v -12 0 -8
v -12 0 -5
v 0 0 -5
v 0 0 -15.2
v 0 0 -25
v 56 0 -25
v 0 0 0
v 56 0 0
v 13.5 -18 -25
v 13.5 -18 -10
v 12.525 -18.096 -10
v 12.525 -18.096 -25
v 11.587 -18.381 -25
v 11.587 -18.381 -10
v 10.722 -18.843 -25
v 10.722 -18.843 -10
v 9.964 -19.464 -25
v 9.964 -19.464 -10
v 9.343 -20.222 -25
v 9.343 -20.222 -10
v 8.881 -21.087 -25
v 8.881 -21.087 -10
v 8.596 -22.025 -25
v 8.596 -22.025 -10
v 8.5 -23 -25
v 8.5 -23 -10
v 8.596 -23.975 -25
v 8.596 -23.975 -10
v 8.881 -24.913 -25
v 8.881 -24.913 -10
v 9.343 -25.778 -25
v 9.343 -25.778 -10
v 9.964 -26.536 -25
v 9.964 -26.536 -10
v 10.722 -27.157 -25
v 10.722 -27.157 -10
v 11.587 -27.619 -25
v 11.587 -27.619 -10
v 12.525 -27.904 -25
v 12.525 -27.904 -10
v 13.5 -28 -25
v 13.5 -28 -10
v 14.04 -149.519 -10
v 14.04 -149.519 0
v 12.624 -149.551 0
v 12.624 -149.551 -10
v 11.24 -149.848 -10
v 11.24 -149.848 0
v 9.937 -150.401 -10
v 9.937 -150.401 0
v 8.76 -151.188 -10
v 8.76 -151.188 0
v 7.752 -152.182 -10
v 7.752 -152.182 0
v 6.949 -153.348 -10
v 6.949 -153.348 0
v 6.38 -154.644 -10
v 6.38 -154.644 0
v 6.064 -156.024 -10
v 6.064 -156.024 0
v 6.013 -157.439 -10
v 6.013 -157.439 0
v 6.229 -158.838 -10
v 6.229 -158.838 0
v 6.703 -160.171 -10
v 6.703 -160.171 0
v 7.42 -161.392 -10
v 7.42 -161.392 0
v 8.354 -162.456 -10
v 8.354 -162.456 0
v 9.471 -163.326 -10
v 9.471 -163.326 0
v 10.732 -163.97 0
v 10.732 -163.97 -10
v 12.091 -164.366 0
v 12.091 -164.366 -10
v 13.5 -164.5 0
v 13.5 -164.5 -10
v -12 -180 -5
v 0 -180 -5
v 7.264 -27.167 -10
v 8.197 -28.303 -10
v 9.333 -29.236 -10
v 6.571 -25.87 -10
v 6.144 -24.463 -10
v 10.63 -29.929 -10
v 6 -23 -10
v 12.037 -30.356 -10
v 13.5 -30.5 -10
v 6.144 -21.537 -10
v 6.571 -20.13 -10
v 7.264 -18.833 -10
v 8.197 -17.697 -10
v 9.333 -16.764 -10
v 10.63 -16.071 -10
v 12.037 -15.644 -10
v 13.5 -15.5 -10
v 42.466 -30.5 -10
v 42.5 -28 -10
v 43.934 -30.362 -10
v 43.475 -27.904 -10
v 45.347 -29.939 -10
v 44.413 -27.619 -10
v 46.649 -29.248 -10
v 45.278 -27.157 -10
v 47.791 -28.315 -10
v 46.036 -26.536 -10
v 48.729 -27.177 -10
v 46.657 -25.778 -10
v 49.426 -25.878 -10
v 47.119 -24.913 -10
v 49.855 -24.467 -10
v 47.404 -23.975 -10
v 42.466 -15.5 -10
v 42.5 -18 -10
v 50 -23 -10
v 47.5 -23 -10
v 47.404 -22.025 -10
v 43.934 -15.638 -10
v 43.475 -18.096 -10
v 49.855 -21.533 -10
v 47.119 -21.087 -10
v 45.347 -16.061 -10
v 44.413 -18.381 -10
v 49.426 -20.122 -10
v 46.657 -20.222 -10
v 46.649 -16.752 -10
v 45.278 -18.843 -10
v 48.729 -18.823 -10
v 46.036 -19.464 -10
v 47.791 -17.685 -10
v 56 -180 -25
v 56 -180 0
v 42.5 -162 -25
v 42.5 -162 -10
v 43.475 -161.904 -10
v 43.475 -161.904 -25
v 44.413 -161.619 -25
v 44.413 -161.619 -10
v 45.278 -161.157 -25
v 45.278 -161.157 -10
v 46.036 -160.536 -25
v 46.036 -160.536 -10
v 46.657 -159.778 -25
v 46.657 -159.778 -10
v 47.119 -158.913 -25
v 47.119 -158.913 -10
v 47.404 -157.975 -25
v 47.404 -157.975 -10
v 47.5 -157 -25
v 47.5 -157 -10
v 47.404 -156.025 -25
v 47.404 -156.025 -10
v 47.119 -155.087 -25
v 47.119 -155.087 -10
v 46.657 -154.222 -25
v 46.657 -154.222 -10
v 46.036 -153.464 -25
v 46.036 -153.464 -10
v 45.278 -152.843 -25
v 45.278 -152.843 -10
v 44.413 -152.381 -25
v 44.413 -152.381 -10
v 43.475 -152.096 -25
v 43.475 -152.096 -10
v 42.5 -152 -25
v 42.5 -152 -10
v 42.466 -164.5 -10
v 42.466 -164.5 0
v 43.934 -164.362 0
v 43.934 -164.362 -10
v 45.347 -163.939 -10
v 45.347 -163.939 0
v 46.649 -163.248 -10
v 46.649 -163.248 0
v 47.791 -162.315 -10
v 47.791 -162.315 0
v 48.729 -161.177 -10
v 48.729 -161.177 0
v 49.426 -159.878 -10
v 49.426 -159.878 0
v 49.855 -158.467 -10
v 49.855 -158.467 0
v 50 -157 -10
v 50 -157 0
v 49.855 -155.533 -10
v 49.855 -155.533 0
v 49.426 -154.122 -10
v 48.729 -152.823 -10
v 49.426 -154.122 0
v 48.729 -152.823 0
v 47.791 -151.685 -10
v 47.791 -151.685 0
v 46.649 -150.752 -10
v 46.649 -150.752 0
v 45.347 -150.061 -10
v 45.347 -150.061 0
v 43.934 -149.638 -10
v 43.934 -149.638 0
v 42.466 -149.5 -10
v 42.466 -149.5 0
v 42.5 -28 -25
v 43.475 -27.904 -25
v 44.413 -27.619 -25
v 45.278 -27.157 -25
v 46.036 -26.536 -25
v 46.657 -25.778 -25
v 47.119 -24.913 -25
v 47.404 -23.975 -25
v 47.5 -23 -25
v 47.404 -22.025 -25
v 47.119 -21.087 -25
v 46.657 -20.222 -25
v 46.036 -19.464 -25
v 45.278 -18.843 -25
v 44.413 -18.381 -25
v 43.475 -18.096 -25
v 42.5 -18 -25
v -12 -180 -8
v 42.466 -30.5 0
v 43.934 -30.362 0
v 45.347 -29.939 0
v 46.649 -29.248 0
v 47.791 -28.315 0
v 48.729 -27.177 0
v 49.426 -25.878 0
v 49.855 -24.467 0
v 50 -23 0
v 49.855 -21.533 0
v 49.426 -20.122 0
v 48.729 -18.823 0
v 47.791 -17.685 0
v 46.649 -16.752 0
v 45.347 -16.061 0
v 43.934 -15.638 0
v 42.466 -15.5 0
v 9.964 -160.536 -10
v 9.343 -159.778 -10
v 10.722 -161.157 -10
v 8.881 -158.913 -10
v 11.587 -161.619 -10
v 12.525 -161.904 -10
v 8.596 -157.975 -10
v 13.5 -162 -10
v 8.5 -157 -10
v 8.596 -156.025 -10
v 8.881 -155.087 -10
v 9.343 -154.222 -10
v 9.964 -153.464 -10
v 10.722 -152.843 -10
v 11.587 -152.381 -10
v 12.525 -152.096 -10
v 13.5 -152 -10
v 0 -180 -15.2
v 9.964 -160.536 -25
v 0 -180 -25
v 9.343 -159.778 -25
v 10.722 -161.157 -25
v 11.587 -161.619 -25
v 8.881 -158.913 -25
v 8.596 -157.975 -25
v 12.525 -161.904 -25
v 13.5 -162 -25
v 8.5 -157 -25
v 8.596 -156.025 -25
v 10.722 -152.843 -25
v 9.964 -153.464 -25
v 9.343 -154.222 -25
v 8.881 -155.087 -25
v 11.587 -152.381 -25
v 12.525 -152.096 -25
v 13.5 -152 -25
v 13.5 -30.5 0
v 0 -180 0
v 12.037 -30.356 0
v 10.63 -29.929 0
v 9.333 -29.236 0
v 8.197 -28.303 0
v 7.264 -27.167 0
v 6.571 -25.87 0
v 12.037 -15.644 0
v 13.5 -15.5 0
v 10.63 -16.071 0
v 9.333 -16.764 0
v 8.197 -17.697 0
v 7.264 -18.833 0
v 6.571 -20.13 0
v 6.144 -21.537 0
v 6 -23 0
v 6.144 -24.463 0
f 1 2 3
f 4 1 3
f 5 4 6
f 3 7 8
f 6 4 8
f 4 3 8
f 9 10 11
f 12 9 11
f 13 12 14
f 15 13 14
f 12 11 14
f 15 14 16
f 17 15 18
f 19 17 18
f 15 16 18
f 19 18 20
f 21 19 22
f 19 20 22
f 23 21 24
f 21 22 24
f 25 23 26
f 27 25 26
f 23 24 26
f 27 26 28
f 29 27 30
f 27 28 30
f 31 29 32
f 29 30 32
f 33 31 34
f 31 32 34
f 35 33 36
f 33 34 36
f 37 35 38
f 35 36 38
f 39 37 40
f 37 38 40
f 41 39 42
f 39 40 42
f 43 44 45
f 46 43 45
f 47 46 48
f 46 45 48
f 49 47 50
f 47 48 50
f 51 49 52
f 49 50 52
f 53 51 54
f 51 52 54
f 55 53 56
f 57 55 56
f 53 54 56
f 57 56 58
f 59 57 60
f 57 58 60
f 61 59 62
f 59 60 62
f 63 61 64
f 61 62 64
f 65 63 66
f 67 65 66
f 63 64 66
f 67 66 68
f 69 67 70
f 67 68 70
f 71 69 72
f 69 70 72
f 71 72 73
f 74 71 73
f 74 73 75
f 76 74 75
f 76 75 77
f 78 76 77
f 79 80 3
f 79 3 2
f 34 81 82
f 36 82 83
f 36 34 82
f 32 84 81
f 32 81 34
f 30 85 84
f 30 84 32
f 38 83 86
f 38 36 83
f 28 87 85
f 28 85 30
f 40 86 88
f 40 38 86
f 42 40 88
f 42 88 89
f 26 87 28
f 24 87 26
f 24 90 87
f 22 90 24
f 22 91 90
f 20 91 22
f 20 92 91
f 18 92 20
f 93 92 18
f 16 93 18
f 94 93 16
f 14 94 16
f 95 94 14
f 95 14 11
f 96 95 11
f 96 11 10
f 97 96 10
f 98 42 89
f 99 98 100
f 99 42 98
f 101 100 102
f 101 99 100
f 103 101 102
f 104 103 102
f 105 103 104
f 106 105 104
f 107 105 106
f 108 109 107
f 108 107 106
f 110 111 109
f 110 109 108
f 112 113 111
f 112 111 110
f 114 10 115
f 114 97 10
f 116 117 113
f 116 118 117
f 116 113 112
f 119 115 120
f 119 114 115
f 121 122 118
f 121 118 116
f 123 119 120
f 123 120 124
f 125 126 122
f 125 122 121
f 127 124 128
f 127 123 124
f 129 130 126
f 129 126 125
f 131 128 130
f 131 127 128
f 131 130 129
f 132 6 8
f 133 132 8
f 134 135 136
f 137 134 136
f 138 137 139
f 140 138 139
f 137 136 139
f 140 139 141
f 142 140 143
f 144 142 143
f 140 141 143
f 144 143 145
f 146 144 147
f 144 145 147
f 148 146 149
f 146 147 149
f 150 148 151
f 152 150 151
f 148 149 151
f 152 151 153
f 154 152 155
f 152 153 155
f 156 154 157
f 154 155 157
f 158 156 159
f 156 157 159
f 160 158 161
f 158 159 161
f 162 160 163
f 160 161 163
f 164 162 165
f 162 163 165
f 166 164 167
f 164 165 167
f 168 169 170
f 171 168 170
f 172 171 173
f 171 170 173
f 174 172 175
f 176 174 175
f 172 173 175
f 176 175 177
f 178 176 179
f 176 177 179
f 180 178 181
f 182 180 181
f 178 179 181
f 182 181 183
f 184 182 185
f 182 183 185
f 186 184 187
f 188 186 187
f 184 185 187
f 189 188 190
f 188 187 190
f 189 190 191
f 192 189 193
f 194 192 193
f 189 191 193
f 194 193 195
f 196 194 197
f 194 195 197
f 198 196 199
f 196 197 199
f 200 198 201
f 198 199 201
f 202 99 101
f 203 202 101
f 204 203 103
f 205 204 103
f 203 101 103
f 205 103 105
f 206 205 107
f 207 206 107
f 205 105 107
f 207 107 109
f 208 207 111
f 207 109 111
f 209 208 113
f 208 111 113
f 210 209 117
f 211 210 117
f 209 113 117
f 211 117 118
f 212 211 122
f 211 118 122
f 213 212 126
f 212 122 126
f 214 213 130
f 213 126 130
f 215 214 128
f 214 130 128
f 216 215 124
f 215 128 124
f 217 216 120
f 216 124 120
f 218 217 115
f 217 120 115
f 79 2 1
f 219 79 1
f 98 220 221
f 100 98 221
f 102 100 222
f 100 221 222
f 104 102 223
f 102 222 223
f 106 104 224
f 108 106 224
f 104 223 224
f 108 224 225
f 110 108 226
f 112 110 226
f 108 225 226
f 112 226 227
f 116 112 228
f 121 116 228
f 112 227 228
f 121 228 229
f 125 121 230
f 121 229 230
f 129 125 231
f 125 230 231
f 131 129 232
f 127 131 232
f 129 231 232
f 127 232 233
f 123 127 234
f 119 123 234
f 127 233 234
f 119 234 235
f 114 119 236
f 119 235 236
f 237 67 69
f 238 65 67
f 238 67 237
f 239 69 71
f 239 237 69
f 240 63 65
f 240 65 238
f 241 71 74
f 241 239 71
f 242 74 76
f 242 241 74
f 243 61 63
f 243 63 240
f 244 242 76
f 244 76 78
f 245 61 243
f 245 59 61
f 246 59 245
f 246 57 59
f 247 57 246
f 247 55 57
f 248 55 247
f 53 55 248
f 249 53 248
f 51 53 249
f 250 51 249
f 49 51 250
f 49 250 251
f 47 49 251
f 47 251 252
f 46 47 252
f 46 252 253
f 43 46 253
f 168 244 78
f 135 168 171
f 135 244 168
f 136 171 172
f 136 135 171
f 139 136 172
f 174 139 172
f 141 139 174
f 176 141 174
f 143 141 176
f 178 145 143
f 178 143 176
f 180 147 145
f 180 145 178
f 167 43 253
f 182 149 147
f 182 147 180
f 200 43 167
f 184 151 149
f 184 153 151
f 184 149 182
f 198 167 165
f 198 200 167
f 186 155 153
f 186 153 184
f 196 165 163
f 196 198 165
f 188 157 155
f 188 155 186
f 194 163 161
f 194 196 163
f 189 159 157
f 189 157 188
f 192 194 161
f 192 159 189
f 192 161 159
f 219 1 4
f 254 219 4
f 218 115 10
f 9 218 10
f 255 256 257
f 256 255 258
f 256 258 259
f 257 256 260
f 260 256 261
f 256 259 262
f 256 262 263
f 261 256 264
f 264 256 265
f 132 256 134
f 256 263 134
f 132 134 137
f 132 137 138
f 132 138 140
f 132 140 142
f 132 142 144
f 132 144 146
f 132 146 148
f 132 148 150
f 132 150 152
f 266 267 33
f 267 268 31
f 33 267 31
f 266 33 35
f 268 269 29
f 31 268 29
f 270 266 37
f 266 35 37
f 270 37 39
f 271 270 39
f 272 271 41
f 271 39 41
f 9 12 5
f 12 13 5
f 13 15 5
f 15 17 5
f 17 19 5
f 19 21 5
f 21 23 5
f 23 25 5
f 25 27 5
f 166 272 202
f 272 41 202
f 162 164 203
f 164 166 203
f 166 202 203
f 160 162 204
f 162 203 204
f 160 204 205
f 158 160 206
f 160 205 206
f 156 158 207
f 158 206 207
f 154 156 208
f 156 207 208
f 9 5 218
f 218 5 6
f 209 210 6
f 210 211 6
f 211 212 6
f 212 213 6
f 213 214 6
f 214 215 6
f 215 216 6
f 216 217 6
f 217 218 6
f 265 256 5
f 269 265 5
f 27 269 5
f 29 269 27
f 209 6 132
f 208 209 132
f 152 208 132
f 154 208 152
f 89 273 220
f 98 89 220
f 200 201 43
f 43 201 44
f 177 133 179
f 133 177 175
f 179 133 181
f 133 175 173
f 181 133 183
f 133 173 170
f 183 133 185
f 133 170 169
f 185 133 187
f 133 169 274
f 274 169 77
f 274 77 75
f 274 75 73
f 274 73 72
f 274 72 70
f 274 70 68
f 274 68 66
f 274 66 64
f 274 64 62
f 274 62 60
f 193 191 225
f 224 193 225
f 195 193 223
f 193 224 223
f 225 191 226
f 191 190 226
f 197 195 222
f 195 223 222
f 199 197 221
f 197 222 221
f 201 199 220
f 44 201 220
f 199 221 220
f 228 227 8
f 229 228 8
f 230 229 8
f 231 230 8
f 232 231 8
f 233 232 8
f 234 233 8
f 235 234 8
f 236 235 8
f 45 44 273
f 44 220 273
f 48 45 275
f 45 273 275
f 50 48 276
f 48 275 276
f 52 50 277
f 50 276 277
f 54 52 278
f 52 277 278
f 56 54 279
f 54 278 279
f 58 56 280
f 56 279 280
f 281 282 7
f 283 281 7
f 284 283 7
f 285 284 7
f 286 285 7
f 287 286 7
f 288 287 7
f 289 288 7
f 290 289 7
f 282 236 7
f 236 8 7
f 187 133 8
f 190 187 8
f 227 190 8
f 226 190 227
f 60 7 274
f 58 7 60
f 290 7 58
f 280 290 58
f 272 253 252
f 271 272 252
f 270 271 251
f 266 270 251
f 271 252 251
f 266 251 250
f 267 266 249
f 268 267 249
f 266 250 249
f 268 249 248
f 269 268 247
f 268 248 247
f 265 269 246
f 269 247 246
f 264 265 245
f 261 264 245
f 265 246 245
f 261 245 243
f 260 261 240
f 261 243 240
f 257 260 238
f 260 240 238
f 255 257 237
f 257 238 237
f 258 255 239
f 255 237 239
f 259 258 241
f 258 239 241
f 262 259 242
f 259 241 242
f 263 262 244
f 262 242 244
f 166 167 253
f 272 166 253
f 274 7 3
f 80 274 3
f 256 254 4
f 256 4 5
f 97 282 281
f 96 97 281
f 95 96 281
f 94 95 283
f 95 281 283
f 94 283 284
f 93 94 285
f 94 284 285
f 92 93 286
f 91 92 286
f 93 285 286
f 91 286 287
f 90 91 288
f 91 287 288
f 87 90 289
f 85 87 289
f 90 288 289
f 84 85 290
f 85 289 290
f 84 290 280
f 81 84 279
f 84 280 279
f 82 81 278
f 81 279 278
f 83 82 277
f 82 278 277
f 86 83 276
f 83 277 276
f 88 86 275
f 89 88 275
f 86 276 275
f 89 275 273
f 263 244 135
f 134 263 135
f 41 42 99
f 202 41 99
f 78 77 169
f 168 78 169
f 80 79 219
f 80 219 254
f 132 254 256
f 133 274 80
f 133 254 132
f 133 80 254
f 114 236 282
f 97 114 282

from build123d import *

# Parameters (mm, degrees)
F1_DEPTH = 180
F3_DEPTH = 10
F5_DEPTH = 25


with BuildPart() as f1:
    # F0 (on Front) → F1 (new body)
    with BuildSketch(Plane.XZ):
        Polygon((56, 0), (0, 0), (0, -5), (-12, -5), (-12, -8), (0, -15.2), (0, -17), (0, -25), (56, -25), align=None)
    extrude(amount=F1_DEPTH)

    # F2 (on face) → F3 (cut)
    with BuildSketch(Plane.XY):
        with BuildLine():
            Line((13.500019, -164.5), (42.466399, -164.499925))
            ThreePointArc((42.466399, -164.499925), (50, -157), (42.466399, -149.500075))
            Line((42.466399, -149.500075), (14.039766, -149.519448))
            ThreePointArc((14.039766, -149.519448), (6.004863, -156.729951), (13.500019, -164.5))
        make_face()
        with BuildLine():
            Line((13.500019, -30.5), (42.466399, -30.499925))
            ThreePointArc((42.466399, -30.499925), (50, -23), (42.466399, -15.500075))
            Line((42.466399, -15.500075), (13.500019, -15.5))
            ThreePointArc((13.500019, -15.5), (6, -23), (13.500019, -30.5))
        make_face()
    extrude(amount=-F3_DEPTH, mode=Mode.SUBTRACT)

    # F4 (on face) → F5 (cut)
    with BuildSketch(Plane.XY):
        with BuildLine():
            Line((42.5, -18), (13.5, -18))
            ThreePointArc((13.5, -18), (8.5, -23), (13.5, -28))
            Line((13.5, -28), (42.5, -28))
            ThreePointArc((42.5, -28), (47.5, -23), (42.5, -18))
        make_face()
        with BuildLine():
            Line((42.5, -152), (13.5, -152))
            ThreePointArc((13.5, -152), (8.5, -157), (13.5, -162))
            Line((13.5, -162), (42.5, -162))
            ThreePointArc((42.5, -162), (47.5, -157), (42.5, -152))
        make_face()
    extrude(amount=-F5_DEPTH, mode=Mode.SUBTRACT)


solid = f1.part
